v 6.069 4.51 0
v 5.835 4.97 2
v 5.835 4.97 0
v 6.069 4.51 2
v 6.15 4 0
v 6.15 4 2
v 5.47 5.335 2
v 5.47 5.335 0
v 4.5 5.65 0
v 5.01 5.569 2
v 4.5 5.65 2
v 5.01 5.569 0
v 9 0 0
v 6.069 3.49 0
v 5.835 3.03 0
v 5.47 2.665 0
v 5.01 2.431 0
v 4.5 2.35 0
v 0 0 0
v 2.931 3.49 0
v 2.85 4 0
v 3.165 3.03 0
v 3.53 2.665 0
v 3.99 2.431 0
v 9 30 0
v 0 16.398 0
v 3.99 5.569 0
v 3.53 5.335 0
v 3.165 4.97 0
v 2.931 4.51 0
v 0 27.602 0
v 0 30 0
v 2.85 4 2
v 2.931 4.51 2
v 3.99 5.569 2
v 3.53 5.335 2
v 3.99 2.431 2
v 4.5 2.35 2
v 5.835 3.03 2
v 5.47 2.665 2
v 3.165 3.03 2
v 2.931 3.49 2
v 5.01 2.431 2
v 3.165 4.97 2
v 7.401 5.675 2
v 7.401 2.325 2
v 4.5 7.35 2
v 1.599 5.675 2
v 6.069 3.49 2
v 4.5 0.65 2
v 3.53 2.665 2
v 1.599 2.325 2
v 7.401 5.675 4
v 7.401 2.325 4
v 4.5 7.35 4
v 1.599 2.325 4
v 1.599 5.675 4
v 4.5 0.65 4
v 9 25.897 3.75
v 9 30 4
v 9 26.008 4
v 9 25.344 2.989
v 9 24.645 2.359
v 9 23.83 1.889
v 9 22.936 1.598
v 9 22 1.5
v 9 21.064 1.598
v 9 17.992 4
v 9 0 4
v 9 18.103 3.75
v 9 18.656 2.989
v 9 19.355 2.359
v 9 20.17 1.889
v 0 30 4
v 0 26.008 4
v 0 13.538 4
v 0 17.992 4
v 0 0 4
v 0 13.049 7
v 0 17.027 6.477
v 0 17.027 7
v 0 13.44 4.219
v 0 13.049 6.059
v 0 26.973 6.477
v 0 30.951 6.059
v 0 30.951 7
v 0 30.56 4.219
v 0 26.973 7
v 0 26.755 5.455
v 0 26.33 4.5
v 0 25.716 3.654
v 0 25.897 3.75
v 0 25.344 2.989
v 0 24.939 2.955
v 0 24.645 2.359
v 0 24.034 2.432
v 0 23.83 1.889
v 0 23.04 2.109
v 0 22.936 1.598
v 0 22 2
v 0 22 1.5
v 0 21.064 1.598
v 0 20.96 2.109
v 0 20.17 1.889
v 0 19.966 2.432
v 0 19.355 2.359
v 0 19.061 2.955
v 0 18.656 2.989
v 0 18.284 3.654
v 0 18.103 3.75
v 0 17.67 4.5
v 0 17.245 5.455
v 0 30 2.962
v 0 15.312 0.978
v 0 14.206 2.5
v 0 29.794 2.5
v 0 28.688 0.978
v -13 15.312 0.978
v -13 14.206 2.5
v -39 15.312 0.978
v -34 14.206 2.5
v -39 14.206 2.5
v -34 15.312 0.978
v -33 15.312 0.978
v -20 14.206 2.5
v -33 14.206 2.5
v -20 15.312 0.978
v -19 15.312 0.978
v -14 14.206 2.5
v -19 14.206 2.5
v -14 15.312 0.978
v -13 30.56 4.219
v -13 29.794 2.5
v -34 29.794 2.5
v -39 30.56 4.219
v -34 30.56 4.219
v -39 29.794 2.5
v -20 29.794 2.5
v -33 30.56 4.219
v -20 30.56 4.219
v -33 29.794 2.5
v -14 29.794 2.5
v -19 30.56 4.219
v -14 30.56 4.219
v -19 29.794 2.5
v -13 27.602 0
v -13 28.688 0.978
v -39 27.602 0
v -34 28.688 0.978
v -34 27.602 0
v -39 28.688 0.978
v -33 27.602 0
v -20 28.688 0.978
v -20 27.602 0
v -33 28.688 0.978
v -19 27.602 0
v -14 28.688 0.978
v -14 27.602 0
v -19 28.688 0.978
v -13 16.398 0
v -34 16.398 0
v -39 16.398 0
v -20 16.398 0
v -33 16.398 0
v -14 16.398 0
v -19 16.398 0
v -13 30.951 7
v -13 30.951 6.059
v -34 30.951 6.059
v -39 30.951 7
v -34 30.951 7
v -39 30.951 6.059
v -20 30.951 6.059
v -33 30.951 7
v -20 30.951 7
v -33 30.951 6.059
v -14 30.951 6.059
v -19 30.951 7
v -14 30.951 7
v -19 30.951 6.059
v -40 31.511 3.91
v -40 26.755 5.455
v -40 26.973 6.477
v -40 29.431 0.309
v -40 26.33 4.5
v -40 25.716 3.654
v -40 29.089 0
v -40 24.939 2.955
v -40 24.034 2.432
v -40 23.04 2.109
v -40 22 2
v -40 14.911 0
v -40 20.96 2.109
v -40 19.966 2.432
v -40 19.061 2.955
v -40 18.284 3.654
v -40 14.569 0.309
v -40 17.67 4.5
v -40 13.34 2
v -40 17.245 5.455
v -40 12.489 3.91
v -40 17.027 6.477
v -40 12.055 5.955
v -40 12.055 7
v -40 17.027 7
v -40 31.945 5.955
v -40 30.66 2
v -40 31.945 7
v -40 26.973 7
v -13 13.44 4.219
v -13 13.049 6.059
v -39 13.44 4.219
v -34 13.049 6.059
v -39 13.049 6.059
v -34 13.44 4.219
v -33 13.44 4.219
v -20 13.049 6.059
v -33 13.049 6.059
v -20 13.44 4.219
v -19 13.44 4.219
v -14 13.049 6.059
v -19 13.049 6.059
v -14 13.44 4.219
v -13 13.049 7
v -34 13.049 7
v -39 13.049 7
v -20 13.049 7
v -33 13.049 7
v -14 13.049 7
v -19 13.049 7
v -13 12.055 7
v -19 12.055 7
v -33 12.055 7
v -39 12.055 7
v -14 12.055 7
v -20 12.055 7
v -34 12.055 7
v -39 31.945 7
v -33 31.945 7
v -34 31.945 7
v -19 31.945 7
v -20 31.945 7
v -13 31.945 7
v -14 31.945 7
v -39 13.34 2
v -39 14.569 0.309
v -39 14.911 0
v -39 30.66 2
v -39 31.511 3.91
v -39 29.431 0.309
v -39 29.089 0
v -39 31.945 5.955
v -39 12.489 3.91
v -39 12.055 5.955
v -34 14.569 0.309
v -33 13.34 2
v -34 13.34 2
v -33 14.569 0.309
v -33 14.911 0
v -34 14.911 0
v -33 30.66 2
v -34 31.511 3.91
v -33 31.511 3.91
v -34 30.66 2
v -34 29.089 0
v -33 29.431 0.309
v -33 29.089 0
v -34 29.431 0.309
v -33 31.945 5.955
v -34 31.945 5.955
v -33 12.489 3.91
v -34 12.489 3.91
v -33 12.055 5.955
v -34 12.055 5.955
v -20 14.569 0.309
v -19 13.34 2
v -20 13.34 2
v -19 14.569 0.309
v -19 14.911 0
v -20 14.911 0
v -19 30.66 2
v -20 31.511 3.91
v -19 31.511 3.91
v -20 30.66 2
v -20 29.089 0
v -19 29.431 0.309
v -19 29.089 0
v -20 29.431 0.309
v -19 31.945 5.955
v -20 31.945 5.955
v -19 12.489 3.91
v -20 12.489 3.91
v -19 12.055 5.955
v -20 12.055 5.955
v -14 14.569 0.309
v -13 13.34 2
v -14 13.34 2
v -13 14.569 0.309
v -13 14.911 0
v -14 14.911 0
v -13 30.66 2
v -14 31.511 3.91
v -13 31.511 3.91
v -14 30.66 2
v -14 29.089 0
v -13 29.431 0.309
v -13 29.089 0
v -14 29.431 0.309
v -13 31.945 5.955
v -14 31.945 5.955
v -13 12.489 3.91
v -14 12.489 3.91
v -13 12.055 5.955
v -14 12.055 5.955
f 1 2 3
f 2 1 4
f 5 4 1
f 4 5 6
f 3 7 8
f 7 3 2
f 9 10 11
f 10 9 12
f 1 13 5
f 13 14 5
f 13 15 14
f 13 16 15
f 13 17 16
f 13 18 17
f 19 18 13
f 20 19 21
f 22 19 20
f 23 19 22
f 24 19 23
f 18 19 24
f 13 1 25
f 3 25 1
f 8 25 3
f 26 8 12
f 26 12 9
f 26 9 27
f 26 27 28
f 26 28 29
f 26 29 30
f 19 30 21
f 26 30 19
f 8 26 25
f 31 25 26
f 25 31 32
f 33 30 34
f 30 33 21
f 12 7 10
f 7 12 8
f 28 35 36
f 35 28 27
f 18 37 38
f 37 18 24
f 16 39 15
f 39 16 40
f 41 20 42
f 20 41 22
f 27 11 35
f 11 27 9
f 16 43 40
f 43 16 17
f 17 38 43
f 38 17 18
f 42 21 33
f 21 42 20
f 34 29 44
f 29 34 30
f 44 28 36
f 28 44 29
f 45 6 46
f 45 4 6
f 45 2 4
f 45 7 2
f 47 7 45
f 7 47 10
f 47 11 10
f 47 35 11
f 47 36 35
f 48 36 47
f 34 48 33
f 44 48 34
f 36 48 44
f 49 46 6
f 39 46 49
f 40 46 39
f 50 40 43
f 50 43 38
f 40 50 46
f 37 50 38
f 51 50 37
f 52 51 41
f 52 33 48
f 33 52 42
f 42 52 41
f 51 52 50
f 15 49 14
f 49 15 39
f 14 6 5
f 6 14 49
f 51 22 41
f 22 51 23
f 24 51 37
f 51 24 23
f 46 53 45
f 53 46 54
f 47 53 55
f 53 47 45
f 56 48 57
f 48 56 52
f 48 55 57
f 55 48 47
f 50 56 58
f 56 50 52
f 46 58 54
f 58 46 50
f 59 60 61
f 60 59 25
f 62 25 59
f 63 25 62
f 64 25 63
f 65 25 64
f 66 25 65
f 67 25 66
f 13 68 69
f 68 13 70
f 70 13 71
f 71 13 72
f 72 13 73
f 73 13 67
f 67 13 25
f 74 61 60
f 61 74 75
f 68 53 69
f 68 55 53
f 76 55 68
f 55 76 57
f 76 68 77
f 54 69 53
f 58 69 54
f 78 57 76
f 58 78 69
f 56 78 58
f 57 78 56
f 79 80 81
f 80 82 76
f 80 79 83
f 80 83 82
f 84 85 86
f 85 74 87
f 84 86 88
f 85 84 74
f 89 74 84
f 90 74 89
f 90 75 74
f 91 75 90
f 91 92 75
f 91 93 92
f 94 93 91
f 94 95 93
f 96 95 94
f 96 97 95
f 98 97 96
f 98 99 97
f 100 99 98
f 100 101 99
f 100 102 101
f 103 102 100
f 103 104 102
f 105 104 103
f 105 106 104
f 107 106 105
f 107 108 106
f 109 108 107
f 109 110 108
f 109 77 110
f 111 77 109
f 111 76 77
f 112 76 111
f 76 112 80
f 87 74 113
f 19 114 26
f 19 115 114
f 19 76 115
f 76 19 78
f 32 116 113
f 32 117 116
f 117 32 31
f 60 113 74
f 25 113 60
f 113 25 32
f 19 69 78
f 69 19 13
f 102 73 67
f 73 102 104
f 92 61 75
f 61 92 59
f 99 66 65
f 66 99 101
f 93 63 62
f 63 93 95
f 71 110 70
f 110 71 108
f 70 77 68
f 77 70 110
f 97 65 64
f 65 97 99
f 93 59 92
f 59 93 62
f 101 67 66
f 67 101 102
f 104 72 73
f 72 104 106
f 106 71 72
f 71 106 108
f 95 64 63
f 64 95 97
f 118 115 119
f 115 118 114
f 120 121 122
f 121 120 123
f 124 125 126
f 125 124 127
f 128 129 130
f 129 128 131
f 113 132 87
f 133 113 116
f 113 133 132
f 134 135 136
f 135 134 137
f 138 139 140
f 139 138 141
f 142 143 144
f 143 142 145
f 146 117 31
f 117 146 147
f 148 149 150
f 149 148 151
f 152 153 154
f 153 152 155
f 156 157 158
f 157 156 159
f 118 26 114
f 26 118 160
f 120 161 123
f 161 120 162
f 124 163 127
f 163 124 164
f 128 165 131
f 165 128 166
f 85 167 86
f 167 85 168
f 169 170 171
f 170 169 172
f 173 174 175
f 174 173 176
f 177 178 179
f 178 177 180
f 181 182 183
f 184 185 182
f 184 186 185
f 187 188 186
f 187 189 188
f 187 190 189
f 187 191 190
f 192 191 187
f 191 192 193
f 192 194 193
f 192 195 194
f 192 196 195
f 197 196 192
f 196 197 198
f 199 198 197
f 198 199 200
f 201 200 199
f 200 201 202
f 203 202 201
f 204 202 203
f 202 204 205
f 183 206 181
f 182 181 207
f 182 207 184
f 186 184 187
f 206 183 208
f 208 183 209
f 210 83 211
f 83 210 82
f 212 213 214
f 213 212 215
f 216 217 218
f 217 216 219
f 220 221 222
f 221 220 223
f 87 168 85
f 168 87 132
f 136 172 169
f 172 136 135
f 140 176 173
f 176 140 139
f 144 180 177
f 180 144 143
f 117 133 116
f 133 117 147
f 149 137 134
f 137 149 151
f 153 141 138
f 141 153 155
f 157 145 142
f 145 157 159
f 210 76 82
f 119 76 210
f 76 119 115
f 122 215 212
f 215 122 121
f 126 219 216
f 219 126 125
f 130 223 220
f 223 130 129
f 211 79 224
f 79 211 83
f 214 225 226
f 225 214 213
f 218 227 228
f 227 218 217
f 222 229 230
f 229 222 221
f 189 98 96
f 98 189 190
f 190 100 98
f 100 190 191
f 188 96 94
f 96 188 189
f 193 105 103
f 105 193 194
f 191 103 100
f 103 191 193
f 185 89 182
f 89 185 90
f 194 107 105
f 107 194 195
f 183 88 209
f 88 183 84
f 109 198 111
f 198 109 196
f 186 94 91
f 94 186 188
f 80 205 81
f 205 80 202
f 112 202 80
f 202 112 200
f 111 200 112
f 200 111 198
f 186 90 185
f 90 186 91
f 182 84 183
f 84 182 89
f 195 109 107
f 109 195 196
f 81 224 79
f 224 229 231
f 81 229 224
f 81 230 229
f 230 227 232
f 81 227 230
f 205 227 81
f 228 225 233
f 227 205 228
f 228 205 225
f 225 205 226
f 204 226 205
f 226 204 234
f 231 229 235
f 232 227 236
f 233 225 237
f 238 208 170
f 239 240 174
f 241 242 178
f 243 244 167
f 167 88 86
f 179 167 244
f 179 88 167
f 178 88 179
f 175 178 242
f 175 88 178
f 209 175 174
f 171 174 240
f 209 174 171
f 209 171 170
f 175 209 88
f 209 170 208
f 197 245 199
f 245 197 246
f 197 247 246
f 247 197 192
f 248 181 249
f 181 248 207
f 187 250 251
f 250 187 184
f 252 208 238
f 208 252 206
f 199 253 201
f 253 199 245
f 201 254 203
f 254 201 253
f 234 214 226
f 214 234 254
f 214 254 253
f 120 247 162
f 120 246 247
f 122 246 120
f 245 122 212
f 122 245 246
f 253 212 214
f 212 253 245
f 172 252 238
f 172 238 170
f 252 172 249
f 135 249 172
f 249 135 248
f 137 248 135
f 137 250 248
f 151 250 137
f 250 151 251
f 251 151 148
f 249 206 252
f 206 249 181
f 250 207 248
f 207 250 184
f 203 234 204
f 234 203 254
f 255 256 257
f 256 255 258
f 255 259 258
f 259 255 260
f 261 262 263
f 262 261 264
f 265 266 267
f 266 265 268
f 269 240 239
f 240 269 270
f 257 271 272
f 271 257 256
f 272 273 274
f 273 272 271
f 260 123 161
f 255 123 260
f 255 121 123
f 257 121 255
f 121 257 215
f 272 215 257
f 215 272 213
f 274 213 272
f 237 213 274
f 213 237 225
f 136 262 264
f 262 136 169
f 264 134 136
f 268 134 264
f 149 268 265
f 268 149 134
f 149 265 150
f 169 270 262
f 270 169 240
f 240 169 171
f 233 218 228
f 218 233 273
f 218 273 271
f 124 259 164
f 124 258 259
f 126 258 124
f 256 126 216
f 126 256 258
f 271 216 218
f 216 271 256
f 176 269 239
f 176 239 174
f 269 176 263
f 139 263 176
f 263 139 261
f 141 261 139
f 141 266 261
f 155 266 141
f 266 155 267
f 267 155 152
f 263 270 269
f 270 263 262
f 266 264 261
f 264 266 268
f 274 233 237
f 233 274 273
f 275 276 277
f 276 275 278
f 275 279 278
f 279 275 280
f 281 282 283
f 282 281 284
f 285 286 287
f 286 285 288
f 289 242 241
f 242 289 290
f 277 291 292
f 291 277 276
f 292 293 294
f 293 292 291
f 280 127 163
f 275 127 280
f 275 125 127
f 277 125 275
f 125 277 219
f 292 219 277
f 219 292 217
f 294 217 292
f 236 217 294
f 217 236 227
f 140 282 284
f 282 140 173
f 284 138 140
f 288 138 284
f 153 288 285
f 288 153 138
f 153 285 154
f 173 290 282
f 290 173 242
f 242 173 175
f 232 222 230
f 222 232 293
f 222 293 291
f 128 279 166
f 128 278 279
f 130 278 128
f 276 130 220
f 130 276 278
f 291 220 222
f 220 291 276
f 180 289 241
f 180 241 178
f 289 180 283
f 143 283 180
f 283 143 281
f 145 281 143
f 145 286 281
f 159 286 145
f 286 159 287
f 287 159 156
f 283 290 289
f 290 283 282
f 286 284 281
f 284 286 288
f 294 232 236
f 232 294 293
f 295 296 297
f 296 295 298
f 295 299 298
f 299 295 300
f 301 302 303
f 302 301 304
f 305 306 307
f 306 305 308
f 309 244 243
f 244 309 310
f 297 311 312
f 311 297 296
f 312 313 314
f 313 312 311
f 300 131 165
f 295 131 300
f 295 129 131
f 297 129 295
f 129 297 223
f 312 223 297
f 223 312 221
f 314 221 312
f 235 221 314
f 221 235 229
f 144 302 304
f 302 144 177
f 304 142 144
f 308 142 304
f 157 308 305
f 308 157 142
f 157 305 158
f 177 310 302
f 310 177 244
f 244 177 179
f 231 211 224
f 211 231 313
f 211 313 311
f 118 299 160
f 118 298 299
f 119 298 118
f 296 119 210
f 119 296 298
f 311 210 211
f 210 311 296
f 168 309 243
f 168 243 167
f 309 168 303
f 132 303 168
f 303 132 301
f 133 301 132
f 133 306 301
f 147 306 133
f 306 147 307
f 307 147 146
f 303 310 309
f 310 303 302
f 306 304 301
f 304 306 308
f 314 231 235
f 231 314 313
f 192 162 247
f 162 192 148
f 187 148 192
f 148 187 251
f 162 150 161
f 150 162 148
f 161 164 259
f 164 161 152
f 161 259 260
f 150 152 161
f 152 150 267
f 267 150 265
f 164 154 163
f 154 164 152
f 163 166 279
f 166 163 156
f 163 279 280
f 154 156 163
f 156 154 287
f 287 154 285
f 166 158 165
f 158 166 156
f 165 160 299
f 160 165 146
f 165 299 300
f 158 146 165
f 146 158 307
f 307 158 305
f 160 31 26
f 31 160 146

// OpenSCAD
// file: ../libs/hardware-recess.scad
/*
 * A library to make capture holes in material for M3 & M5 hardware and some
 * common mounting patterns.
 * Copyright 2021 Alex Volkov <alex@flamy.ca>
 *
 * Project URL
 * https://github.com/avolkov/openscad-designs
 *
 * License: Attribution-ShareAlike 4.0 International (CC BY-SA)
 * https://creativecommons.org/licenses/by-sa/4.0/
 *
 * Version 0.1 2021-04-05 Initial publication
 */

// Common mounting patterns
ear_thick=8;
stacked_len = ear_thick*3;
screw_mount_space = 20;
screw_mount_offset =7;
total_len = stacked_len + screw_mount_space*2;
mounting_diff = 8;


//Globals for hardware diameters
M3_THREAD_RAD = 1.5;
M5_THREAD_RAD = 2.6;


m3_nut_trap_d = 6.7;
m3_nut_thick= 2.4;

//M3 fastener values
m3_bolt_head_d = 5.6;
m3_bolt_thick = 3.2;

//M5 fastener values
m5_nut_thick = 4;
m5_locknut_thick = 5;
nut_trap_d = 9.7;
bolt_head_d = 8.6;



module bolt_nut(hole_len, bolt_d, flip=false){
    /*
    Create a model for a hole with bolt end on one end and nut hole on the other end.
    Note, this functions doesn't subtract the model it only makes the model

    :hole_len: total length of the hole
    :bolt_d: diameter of a blot
    :flip: flip the side with bolt recess
    */
    // currently only implemented for 3mm
    if (flip){
        hole_w_end(hole_len, m3_nut_thick, "hex", bolt_d);
        translate([0,0, hole_len]){
            rotate([180, 0, 0]){
                hole_w_end(hole_len, m3_bolt_thick, "round", bolt_d);
            }
        }
    } else {
        hole_w_end(hole_len, m3_bolt_thick, "round", bolt_d);
        translate([0,0, hole_len]){
            rotate([180, 0, 0]){
                hole_w_end(hole_len, m3_nut_thick, "hex", bolt_d);
            }
        }
    }
}


module hole_w_end(hole_len, trap_height, type, bolt_d, flip=false){
    /*
    Make a hole with an end for bolt or a nut.
    This is a more generic functions replacing m5_ hole-making functions.

    :bolt_d: bolt diameter, i.e. 3, 5 mm
    :type: type of the head hole: 'none', 'hex', 'round
    */
    if (type != "none"){
        cylinder(h=hole_len-trap_height, d=bolt_d, $fn=20);
        if (flip){
            m_recess(trap_height, type, bolt_d);
            translate([0,0,trap_height])
                cylinder(h=hole_len-trap_height, d=bolt_d, $fn=20);

        } else {
                translate([0,0, hole_len - trap_height])
                    m_recess(trap_height, type, bolt_d);
        }
    } else {
        cylinder(h=hole_len, d=bolt_d);
    }
}

module m_recess(length, end_type, bolt_d) {
    /*
    Create nut or bolt capture hole

    :height: length of a mounting hole, including end-mounting hardware
    :end_type: type of the head hole: 'none', 'hex', 'round
    :bolt_d: bolt diameter, i.e. 3, 5 mm
    */
    if (bolt_d >= 3 && bolt_d <= 4){
        //M3
        make_recess(length, end_type, m3_nut_trap_d);
    } else if (bolt_d >= 5 && bolt_d <= 6){
        // M5
        make_recess(length, end_type, nut_trap_d);
    }

}

module make_recess(height, end_type, trap_d){
    /*
    Make recess to capture
    */
    rotate([0, 0,90]){
        if (end_type == "hex"){
            cylinder(h=height, d=trap_d, $fn=6);
        } else if (end_type == "round"){
            cylinder(h=height, d=trap_d, $fn=20);
        }
    }
}


//Functions specific to M5 size,
// TODO rewrite as hole_w_end m_recess
module m5_recess(height, end_type) {
    // nut/bolt capture hole
    rotate([0, 0,90]){
        if (end_type == "hex"){
            cylinder(h=height, d=nut_trap_d, $fn=6);
        } else if (end_type == "round"){
            cylinder(h=height, d=nut_trap_d, $fn=20);
        }
    }
}



module m5_hole_w_end(hole_len, trap_height, type){
    //Given hole lenght and trap height create a nut trap hole
    if (type != "none"){
        cylinder(h=hole_len-trap_height, d=5.3, $fn=20); // M5 hole;
            translate([0,0, hole_len-trap_height])
                m5_recess(trap_height, type);
    } else {
        cylinder(h=hole_len, d=5.3); // M5 hole;
    }
}
module m5_hole_w_ends(hole_len, nut_extra=0){
    m5_hole_w_end(hole_len, m5_nut_thick, "round");
    rotate([0, 180, 0])
        translate([0, 0, - hole_len])
            m5_hole_w_end(hole_len, m5_nut_thick + nut_extra, "hex");
}

module m3_hole_w_ends(hole_len, nut_extra=0){
    hole_w_end(hole_len, m3_nut_thick, "round", m3_bolt_thick);
    hole_w_end(hole_len, m3_nut_thick, "hex", m3_bolt_thick, flip=true);
}

module set_mounting_hole(x_offset, y_offset, thickness, nut_height, end_type){
    /*
    Make a hole in an existing material
    end_type: one of hex, round, none
    */
    translate([x_offset, y_offset, 0]){
        m5_hole_w_end(thickness, nut_height, end_type);
    }
}

module m5_thread(height){
    cylinder(h=height, r1=M5_THREAD_RAD, r2=M5_THREAD_RAD, center=true, $fn=16);
}

module m3_thread(height){
    cylinder(h=height, r1=M3_THREAD_RAD, r2=M3_THREAD_RAD, center=true, $fn=16);
}

module m3_square_nut(depth, height){
    translate([0,0,1])
        cylinder(
        h=height, r1=M3_THREAD_RAD, r2=M3_THREAD_RAD, center=true, $fn=16);

    m_recess(m3_nut_thick, "hex",3);
    translate([0,0,-1])
        cylinder(
            h=depth, r1=M3_THREAD_RAD, r2=M3_THREAD_RAD, center=true, $fn=16);
}



//Mounting Patterns

module mounting_holes_2(fastener_len, nut_height, end_type){
    /* Two-hole mounting pattern for M5 bolts*/
    width_offsetn = 16;
    set_mounting_hole(
        screw_mount_offset,
        width_offset + mounting_diff,
        fastener_len,
        nut_height,
        end_type);

    set_mounting_hole(
        total_len - screw_mount_offset,
        width_offset + mounting_diff,
        fastener_len,
        nut_height,
        end_type);


 }

module mounting_holes(fastener_len, nut_height, end_type){
    /*Four-hole mounting pattern for M5 bolts*/
    width_offset = 16;
    set_mounting_hole(
        screw_mount_offset,
        width_offset + mounting_diff,
        fastener_len,
        nut_height,
        end_type);

    set_mounting_hole(
        screw_mount_offset,
        width_offset - mounting_diff,
        fastener_len,
        nut_height,
        end_type);

    // Side towards the end
    set_mounting_hole(
        total_len - screw_mount_offset,
        width_offset + mounting_diff,
        fastener_len,
        nut_height,
        end_type);

    set_mounting_hole(
        total_len - screw_mount_offset,
        width_offset - mounting_diff,
        fastener_len,
        nut_height,
        end_type);
}
// main file
include <../libs/hardware-recess.scad>;
$fn=30;

module cable_mount(cable_len, out_d, in_d){
    rotate([0, 90, 0 ]){
    difference(){
        cylinder(d=out_d, h=cable_len);
        cylinder(d=in_d, h=cable_len);
        translate([-out_d/2, 0, cable_len/2])
            cube([out_d, out_d, cable_len], center=true);
        }
    }
}

BASE_L = 30;

CABLE_MOUNT_X_OFFSET=22;
CABLE_MOUNT_Z_OFFSET=7;

CABLE_MOUNT_L=40;
CABLE_MOUNT_INNER_D=10;
CABLE_MOUNT_OUTER_D=18;

//cube([9, 9, 2]);
difference() {
    cube([9, BASE_L, 4]);
    translate([4.5, 4, 0])
        hole_w_end(5, 3, "hex", 3.3, flip=false);
    translate([0, CABLE_MOUNT_X_OFFSET, CABLE_MOUNT_Z_OFFSET-1])
        rotate([0,90, 0])
            cylinder(h=20, d=9);
}
translate([-CABLE_MOUNT_L, CABLE_MOUNT_X_OFFSET, CABLE_MOUNT_Z_OFFSET]){
    difference(){
        union(){
            cable_mount(CABLE_MOUNT_L, CABLE_MOUNT_OUTER_D, CABLE_MOUNT_INNER_D);
            cable_mount(1, CABLE_MOUNT_OUTER_D+2, CABLE_MOUNT_INNER_D+2);
            translate([6, 0, 0])
                cable_mount(1, CABLE_MOUNT_OUTER_D+2, CABLE_MOUNT_INNER_D+2);
            
            translate([20, 0, 0])
                cable_mount(1, CABLE_MOUNT_OUTER_D+2, CABLE_MOUNT_INNER_D+2);
            translate([26, 0, 0])
                cable_mount(1, CABLE_MOUNT_OUTER_D+2, CABLE_MOUNT_INNER_D+2);
        }
        translate([0, -10, -CABLE_MOUNT_Z_OFFSET - 3])
            cube([CABLE_MOUNT_L, CABLE_MOUNT_OUTER_D+5, 3]);
    }
}
